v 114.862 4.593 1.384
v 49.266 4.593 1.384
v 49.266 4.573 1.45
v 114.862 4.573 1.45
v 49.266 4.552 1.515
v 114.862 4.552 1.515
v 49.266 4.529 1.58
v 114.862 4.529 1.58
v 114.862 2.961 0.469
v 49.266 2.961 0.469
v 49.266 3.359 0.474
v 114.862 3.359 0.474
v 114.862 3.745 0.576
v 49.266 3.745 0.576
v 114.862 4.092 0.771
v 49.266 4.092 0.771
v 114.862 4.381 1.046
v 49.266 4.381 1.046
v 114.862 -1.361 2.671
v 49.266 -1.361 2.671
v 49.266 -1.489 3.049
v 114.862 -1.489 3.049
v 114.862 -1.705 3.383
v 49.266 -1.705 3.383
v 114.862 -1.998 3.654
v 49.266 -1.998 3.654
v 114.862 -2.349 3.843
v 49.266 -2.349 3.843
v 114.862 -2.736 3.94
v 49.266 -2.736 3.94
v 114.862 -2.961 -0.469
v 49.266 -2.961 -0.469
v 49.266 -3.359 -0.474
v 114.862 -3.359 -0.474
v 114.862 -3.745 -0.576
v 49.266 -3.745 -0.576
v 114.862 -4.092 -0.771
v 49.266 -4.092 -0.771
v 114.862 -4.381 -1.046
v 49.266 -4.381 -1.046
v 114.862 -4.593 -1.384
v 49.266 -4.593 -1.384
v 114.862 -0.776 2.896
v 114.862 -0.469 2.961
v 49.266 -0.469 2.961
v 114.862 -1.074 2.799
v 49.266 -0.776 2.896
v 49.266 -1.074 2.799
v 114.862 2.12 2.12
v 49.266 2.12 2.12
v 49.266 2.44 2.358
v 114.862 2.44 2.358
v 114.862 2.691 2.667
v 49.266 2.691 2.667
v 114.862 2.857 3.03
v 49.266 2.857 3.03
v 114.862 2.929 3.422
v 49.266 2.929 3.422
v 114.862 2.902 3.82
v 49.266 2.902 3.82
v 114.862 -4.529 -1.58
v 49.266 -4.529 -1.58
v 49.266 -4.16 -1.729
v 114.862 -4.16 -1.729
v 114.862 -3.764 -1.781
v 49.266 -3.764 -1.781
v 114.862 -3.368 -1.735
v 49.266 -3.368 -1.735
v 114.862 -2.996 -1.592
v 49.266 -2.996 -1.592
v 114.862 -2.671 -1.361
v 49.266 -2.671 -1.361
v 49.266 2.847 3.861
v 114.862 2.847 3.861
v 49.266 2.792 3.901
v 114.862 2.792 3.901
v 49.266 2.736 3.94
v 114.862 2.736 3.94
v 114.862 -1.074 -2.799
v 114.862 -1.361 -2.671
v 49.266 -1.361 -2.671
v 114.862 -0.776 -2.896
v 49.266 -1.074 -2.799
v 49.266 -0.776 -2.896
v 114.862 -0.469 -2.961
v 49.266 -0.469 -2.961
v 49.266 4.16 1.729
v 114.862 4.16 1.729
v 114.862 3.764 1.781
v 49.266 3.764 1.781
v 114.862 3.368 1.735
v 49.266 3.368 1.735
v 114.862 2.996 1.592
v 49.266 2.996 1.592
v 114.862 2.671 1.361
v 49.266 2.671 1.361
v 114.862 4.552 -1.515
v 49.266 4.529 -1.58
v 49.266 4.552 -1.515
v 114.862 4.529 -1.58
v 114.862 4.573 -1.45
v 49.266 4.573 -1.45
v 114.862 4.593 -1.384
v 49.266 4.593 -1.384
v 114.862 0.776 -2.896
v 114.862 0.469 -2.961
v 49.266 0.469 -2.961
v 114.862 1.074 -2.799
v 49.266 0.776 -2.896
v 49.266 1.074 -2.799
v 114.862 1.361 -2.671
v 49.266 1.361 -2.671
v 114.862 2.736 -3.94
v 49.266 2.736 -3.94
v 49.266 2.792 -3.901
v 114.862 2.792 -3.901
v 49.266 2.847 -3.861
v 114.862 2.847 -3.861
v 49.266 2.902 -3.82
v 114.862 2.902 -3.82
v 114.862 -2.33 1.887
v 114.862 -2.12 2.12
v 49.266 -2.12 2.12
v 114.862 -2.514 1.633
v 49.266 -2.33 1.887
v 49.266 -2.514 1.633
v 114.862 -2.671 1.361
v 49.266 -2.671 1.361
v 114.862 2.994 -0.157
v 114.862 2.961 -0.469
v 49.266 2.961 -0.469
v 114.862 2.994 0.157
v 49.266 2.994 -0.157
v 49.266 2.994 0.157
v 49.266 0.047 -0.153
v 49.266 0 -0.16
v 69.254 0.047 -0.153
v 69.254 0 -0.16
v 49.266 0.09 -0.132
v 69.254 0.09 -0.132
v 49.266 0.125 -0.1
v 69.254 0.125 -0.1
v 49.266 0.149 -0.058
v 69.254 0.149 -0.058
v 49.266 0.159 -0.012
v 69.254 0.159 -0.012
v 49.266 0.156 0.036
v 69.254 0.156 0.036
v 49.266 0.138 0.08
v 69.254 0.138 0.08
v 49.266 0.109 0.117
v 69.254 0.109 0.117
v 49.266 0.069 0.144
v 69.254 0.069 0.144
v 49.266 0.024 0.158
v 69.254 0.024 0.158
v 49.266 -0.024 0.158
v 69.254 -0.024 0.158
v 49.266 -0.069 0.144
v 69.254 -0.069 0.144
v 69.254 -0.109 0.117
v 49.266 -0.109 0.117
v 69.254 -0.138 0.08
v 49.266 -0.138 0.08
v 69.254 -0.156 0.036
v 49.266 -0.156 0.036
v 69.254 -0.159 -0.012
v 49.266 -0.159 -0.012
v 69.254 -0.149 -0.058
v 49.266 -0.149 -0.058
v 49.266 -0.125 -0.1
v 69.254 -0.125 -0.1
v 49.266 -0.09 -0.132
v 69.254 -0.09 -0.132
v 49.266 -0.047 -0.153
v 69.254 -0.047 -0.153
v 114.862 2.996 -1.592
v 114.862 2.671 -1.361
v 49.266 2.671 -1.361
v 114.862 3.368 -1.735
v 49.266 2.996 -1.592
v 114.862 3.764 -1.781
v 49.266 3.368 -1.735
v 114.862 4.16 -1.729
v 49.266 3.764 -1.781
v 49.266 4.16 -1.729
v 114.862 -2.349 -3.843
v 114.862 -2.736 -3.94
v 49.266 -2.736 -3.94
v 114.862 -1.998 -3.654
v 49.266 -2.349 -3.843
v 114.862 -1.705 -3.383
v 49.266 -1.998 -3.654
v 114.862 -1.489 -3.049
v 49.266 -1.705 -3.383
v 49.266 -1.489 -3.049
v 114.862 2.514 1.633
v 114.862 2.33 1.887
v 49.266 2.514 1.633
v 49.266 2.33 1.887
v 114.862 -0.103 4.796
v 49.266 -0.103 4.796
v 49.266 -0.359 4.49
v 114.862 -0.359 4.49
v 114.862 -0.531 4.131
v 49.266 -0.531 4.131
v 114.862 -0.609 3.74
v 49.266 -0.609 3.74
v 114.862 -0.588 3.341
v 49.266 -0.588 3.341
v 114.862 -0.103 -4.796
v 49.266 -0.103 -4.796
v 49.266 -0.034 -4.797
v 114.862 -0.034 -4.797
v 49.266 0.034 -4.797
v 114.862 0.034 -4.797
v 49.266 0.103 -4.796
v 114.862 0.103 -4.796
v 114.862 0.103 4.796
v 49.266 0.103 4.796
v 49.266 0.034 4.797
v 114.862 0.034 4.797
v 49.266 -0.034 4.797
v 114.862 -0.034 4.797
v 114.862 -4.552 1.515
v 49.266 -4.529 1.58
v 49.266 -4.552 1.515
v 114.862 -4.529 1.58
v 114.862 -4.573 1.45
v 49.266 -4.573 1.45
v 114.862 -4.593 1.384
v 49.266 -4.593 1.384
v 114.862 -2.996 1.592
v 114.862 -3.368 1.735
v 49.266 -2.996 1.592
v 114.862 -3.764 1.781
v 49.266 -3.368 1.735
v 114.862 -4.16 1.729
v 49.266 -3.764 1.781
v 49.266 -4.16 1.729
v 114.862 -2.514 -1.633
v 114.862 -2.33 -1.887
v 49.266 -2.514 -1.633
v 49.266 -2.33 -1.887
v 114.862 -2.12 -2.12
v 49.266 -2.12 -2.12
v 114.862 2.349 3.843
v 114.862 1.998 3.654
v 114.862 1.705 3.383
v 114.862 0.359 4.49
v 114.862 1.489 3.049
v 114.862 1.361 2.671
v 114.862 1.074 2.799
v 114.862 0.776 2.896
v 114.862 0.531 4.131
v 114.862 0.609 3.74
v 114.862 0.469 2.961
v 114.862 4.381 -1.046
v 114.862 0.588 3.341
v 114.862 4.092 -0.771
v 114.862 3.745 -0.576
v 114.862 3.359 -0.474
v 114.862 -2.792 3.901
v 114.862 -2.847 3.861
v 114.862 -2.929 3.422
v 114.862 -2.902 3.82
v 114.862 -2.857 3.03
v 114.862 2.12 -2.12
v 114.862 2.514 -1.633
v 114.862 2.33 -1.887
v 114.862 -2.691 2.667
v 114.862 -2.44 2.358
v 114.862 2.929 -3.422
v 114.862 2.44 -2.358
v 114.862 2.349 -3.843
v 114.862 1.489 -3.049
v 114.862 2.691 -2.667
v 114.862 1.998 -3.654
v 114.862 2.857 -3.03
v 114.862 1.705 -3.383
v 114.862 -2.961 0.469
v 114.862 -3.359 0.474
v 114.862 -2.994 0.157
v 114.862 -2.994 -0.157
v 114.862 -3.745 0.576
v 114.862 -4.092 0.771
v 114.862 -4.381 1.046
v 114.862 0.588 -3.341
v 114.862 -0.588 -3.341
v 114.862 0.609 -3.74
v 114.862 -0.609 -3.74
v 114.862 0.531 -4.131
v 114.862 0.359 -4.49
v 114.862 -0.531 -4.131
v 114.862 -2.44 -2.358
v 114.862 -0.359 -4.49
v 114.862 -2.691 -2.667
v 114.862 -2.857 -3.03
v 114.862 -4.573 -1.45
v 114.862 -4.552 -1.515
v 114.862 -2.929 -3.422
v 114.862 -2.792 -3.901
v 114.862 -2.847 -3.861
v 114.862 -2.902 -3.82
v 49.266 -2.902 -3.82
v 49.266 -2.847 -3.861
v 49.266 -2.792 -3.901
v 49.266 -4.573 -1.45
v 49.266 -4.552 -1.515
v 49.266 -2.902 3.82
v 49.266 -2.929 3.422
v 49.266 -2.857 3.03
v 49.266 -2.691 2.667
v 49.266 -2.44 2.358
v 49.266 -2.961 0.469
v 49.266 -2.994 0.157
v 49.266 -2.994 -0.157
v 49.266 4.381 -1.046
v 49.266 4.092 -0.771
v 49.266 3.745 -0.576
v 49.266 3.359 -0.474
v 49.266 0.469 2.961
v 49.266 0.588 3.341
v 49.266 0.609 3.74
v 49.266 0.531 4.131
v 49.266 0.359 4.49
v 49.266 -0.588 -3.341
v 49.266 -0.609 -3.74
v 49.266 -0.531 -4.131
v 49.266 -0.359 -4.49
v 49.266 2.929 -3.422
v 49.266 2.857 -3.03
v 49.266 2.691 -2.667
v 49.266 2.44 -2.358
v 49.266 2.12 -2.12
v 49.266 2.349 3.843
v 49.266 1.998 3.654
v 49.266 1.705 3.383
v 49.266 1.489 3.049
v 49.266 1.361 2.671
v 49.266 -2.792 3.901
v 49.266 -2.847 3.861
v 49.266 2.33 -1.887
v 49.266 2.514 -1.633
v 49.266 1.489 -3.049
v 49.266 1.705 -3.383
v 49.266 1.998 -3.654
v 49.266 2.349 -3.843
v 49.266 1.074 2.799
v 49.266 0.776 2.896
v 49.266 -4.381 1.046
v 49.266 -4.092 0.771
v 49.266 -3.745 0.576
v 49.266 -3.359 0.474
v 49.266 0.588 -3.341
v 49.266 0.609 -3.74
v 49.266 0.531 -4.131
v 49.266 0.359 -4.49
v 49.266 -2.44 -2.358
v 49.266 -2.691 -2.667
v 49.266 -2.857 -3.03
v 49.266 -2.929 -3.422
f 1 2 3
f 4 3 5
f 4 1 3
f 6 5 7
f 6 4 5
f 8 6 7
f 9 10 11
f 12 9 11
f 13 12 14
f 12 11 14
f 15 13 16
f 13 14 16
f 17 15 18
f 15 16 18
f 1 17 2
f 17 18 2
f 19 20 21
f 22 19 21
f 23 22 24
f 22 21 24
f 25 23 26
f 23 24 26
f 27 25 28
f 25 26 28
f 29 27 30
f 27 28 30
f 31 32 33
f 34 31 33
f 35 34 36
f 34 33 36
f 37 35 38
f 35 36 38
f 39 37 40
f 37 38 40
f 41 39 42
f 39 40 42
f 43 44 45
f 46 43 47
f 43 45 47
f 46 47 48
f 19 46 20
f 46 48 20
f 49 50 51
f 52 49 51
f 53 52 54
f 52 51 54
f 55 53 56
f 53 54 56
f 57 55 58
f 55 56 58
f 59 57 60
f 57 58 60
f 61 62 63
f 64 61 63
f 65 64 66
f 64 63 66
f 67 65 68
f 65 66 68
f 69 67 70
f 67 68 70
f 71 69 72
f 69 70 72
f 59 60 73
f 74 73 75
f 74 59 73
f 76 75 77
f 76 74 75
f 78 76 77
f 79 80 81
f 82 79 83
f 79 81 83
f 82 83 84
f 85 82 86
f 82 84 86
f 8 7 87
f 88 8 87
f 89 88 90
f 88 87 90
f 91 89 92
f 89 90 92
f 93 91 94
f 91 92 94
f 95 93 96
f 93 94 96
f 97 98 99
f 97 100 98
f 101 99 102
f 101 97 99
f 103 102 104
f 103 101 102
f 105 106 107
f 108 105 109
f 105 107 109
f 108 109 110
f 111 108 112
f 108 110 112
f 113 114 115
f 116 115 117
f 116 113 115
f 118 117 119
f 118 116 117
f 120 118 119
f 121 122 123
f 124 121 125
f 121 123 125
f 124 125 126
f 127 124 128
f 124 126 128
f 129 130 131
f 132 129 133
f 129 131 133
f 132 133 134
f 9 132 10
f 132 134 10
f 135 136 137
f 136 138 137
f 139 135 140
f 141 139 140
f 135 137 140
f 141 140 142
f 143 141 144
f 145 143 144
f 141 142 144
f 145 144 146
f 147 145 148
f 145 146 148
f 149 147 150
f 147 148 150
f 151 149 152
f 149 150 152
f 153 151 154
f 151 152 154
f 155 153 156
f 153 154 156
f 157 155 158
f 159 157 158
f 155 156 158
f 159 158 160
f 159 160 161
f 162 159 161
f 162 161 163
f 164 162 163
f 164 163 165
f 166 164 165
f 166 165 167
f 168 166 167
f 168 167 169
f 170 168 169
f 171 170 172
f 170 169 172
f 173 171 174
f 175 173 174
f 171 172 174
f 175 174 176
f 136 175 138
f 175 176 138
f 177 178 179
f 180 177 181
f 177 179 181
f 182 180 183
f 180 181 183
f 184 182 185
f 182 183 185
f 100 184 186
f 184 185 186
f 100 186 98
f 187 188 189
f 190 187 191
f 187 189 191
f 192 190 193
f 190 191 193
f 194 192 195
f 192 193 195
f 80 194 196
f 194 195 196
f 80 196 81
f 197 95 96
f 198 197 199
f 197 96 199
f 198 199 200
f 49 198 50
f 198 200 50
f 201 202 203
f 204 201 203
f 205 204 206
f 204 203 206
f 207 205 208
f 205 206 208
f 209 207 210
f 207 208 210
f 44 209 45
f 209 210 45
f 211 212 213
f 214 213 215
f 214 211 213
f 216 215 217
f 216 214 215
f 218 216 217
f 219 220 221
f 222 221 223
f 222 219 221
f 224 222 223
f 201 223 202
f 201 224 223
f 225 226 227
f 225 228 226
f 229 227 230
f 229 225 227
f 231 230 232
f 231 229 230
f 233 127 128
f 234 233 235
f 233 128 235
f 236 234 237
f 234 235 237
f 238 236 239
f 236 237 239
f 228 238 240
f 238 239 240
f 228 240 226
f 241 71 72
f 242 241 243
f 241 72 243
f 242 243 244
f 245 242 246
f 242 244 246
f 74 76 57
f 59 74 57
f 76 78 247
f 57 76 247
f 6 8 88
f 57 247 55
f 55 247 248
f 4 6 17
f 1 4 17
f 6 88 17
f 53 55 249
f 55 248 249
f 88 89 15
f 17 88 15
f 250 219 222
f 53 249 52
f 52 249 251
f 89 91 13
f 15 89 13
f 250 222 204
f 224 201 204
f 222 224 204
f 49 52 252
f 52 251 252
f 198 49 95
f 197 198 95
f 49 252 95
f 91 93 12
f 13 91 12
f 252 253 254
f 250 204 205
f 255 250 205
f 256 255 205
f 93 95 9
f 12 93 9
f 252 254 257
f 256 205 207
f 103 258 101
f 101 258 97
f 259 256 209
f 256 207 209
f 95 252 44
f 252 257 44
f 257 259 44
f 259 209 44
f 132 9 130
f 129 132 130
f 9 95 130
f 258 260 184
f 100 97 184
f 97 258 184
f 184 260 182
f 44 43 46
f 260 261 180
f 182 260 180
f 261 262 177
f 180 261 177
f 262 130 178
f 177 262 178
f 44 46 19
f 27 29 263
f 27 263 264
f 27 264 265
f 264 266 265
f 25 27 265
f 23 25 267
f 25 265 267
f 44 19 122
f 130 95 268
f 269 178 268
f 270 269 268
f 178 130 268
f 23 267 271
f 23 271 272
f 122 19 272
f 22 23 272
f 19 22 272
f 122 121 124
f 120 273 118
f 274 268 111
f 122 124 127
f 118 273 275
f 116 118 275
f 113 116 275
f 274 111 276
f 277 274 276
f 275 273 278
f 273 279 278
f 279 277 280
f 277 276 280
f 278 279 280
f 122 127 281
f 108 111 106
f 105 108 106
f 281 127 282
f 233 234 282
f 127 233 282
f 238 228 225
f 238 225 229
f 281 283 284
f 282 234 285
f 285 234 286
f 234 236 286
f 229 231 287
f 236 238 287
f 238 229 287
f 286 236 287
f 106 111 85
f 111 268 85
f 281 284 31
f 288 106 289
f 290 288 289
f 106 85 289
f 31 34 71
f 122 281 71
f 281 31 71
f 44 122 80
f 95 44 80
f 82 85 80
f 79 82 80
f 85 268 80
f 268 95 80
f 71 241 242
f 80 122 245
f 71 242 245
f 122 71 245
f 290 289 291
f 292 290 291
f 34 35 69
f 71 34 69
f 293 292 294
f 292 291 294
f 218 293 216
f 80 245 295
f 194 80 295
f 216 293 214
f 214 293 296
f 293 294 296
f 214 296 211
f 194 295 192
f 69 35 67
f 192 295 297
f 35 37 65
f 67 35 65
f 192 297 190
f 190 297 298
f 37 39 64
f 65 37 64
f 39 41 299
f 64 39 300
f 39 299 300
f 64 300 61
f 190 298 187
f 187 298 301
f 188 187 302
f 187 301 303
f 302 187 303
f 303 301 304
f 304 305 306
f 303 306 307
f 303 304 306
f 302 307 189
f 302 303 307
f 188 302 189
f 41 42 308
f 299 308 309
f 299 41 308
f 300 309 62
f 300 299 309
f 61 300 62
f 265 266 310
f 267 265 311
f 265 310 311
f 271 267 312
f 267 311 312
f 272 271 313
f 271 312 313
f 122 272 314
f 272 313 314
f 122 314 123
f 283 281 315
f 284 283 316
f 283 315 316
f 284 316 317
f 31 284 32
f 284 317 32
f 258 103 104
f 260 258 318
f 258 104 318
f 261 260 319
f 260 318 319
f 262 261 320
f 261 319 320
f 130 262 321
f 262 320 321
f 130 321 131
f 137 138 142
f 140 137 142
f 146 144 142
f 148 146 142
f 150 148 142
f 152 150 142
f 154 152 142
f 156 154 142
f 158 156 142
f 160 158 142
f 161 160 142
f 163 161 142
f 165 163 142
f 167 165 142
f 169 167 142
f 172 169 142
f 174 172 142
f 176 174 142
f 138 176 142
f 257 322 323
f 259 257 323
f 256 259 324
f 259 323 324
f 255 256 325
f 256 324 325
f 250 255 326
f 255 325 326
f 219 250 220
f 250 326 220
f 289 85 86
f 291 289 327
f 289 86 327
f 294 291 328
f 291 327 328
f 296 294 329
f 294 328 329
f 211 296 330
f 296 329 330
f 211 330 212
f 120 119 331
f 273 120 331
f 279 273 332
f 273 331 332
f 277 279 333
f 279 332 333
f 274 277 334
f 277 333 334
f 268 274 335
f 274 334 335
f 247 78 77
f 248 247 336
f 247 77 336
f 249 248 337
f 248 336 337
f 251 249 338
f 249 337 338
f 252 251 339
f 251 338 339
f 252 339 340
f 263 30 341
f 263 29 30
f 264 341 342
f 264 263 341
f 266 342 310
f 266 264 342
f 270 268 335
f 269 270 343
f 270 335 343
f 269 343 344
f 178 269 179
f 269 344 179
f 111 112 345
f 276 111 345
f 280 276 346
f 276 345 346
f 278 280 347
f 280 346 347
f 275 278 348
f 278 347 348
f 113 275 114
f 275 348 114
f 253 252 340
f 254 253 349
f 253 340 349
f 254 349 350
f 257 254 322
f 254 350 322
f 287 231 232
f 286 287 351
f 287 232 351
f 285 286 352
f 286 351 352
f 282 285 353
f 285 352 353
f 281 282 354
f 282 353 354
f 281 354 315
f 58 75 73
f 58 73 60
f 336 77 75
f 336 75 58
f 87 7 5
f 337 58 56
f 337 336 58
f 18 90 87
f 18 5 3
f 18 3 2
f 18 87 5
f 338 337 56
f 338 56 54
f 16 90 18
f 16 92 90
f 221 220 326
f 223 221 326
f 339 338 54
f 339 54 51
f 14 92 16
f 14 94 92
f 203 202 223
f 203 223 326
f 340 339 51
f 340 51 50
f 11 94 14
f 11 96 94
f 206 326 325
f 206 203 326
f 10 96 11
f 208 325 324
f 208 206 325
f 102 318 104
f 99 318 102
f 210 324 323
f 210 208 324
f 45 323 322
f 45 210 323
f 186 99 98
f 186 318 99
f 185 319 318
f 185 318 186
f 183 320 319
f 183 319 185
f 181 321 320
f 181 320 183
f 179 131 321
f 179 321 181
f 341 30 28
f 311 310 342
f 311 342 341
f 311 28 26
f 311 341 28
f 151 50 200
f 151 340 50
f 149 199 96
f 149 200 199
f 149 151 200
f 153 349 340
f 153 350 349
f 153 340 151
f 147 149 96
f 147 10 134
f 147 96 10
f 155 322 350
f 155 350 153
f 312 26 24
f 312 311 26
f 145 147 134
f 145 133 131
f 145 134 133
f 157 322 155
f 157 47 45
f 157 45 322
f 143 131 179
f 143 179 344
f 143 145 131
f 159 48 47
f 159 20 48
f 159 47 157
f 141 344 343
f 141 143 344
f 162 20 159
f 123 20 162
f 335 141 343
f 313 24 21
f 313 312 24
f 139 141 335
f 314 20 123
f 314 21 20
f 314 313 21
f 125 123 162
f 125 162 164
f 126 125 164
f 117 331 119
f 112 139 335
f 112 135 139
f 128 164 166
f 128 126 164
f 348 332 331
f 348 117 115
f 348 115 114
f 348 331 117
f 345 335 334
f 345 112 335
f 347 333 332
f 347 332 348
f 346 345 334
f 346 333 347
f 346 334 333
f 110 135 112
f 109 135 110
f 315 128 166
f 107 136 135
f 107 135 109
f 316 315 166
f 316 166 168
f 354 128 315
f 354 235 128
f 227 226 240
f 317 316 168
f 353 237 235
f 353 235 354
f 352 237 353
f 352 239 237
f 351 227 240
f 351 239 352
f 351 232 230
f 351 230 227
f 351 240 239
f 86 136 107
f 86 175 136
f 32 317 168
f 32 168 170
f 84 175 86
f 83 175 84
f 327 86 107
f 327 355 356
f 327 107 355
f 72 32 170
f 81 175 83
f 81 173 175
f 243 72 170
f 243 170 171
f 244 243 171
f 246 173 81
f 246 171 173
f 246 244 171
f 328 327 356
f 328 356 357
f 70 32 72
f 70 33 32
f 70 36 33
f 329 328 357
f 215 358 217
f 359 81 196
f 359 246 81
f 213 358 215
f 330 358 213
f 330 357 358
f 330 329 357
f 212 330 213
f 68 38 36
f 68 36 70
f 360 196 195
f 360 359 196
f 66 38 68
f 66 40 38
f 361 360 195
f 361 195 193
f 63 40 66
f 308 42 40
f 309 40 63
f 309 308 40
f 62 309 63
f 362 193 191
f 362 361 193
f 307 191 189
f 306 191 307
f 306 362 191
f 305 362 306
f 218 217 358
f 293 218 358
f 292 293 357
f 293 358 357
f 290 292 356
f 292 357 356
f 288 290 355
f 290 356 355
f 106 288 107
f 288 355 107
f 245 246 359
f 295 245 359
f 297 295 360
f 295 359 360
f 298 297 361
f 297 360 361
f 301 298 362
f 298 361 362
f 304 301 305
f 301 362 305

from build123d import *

# Parameters (mm, degrees)
BASPROSKE_W     = 164.092427176
BASPROSKE_H     = 12
TOOTHCUT_DEPTH  = 165.967647302
TEETHCUTS_COUNT = 10
TEETHCUTS_ANGLE = 324
BORSKE_R        = 0.4
BORE_DEPTH      = 50.0000508
SCALE1_SCALE    = 0.399751684


with BuildPart() as part:
    # BasProSke → Base-Revolve (revolve)
    with BuildSketch(Plane(origin=(0, 0, 0), x_dir=(1, 0, 0), z_dir=(0, 1, 0)), mode=Mode.PRIVATE) as base_revolve_sk:
        with Locations((82.046213588, 6)):
            Rectangle(BASPROSKE_W, BASPROSKE_H)
    revolve(base_revolve_sk.sketch.rotate(Axis((-10, 0, 0), (1, 0, 0)), 180), axis=Axis((-10, 0, 0), (1, 0, 0)))

    # TooCutSke → ToothCut (cut, through all)
    with BuildSketch(Plane(origin=(0, 0, 0), x_dir=(0, 0, -1), z_dir=(1, 0, 0))):
        with BuildLine():
            ThreePointArc((1.173662691, 7.406586048), (0, 7.499), (-1.173662691, 7.406586048))
            ThreePointArc((-1.173662691, 7.406586048), (-1.668191438, 9.834565786), (-3.497907776, 11.50542856))
            ThreePointArc((-3.497907776, 11.50542856), (0, 12.0254), (3.497907776, 11.50542856))
            ThreePointArc((3.497907776, 11.50542856), (1.668191438, 9.834565786), (1.173662691, 7.406586048))
        make_face()
    toothcut = extrude(amount=TOOTHCUT_DEPTH, mode=Mode.SUBTRACT)

    # TeethCuts: ToothCut ×10 about axis
    teethcuts_axis = Axis((-10, 0, 0), (1, 0, 0))
    for i in range(1, TEETHCUTS_COUNT):
        add(toothcut.rotate(teethcuts_axis, i * TEETHCUTS_ANGLE / (TEETHCUTS_COUNT - 1)), mode=Mode.SUBTRACT)

    # BorSke → Bore (cut, symmetric)
    with BuildSketch(Plane(origin=(0, 0, 0), x_dir=(0, 0, -1), z_dir=(1, 0, 0))):
        Circle(BORSKE_R)
    extrude(amount=BORE_DEPTH, both=True, mode=Mode.SUBTRACT)


with BuildPart() as part_1:
    # Scale1: scaled about (82.076460717, 0, 0)
    add(part.part.scale(SCALE1_SCALE).moved(Location((49.266257357, 0, 0))))


solid = part_1.part
